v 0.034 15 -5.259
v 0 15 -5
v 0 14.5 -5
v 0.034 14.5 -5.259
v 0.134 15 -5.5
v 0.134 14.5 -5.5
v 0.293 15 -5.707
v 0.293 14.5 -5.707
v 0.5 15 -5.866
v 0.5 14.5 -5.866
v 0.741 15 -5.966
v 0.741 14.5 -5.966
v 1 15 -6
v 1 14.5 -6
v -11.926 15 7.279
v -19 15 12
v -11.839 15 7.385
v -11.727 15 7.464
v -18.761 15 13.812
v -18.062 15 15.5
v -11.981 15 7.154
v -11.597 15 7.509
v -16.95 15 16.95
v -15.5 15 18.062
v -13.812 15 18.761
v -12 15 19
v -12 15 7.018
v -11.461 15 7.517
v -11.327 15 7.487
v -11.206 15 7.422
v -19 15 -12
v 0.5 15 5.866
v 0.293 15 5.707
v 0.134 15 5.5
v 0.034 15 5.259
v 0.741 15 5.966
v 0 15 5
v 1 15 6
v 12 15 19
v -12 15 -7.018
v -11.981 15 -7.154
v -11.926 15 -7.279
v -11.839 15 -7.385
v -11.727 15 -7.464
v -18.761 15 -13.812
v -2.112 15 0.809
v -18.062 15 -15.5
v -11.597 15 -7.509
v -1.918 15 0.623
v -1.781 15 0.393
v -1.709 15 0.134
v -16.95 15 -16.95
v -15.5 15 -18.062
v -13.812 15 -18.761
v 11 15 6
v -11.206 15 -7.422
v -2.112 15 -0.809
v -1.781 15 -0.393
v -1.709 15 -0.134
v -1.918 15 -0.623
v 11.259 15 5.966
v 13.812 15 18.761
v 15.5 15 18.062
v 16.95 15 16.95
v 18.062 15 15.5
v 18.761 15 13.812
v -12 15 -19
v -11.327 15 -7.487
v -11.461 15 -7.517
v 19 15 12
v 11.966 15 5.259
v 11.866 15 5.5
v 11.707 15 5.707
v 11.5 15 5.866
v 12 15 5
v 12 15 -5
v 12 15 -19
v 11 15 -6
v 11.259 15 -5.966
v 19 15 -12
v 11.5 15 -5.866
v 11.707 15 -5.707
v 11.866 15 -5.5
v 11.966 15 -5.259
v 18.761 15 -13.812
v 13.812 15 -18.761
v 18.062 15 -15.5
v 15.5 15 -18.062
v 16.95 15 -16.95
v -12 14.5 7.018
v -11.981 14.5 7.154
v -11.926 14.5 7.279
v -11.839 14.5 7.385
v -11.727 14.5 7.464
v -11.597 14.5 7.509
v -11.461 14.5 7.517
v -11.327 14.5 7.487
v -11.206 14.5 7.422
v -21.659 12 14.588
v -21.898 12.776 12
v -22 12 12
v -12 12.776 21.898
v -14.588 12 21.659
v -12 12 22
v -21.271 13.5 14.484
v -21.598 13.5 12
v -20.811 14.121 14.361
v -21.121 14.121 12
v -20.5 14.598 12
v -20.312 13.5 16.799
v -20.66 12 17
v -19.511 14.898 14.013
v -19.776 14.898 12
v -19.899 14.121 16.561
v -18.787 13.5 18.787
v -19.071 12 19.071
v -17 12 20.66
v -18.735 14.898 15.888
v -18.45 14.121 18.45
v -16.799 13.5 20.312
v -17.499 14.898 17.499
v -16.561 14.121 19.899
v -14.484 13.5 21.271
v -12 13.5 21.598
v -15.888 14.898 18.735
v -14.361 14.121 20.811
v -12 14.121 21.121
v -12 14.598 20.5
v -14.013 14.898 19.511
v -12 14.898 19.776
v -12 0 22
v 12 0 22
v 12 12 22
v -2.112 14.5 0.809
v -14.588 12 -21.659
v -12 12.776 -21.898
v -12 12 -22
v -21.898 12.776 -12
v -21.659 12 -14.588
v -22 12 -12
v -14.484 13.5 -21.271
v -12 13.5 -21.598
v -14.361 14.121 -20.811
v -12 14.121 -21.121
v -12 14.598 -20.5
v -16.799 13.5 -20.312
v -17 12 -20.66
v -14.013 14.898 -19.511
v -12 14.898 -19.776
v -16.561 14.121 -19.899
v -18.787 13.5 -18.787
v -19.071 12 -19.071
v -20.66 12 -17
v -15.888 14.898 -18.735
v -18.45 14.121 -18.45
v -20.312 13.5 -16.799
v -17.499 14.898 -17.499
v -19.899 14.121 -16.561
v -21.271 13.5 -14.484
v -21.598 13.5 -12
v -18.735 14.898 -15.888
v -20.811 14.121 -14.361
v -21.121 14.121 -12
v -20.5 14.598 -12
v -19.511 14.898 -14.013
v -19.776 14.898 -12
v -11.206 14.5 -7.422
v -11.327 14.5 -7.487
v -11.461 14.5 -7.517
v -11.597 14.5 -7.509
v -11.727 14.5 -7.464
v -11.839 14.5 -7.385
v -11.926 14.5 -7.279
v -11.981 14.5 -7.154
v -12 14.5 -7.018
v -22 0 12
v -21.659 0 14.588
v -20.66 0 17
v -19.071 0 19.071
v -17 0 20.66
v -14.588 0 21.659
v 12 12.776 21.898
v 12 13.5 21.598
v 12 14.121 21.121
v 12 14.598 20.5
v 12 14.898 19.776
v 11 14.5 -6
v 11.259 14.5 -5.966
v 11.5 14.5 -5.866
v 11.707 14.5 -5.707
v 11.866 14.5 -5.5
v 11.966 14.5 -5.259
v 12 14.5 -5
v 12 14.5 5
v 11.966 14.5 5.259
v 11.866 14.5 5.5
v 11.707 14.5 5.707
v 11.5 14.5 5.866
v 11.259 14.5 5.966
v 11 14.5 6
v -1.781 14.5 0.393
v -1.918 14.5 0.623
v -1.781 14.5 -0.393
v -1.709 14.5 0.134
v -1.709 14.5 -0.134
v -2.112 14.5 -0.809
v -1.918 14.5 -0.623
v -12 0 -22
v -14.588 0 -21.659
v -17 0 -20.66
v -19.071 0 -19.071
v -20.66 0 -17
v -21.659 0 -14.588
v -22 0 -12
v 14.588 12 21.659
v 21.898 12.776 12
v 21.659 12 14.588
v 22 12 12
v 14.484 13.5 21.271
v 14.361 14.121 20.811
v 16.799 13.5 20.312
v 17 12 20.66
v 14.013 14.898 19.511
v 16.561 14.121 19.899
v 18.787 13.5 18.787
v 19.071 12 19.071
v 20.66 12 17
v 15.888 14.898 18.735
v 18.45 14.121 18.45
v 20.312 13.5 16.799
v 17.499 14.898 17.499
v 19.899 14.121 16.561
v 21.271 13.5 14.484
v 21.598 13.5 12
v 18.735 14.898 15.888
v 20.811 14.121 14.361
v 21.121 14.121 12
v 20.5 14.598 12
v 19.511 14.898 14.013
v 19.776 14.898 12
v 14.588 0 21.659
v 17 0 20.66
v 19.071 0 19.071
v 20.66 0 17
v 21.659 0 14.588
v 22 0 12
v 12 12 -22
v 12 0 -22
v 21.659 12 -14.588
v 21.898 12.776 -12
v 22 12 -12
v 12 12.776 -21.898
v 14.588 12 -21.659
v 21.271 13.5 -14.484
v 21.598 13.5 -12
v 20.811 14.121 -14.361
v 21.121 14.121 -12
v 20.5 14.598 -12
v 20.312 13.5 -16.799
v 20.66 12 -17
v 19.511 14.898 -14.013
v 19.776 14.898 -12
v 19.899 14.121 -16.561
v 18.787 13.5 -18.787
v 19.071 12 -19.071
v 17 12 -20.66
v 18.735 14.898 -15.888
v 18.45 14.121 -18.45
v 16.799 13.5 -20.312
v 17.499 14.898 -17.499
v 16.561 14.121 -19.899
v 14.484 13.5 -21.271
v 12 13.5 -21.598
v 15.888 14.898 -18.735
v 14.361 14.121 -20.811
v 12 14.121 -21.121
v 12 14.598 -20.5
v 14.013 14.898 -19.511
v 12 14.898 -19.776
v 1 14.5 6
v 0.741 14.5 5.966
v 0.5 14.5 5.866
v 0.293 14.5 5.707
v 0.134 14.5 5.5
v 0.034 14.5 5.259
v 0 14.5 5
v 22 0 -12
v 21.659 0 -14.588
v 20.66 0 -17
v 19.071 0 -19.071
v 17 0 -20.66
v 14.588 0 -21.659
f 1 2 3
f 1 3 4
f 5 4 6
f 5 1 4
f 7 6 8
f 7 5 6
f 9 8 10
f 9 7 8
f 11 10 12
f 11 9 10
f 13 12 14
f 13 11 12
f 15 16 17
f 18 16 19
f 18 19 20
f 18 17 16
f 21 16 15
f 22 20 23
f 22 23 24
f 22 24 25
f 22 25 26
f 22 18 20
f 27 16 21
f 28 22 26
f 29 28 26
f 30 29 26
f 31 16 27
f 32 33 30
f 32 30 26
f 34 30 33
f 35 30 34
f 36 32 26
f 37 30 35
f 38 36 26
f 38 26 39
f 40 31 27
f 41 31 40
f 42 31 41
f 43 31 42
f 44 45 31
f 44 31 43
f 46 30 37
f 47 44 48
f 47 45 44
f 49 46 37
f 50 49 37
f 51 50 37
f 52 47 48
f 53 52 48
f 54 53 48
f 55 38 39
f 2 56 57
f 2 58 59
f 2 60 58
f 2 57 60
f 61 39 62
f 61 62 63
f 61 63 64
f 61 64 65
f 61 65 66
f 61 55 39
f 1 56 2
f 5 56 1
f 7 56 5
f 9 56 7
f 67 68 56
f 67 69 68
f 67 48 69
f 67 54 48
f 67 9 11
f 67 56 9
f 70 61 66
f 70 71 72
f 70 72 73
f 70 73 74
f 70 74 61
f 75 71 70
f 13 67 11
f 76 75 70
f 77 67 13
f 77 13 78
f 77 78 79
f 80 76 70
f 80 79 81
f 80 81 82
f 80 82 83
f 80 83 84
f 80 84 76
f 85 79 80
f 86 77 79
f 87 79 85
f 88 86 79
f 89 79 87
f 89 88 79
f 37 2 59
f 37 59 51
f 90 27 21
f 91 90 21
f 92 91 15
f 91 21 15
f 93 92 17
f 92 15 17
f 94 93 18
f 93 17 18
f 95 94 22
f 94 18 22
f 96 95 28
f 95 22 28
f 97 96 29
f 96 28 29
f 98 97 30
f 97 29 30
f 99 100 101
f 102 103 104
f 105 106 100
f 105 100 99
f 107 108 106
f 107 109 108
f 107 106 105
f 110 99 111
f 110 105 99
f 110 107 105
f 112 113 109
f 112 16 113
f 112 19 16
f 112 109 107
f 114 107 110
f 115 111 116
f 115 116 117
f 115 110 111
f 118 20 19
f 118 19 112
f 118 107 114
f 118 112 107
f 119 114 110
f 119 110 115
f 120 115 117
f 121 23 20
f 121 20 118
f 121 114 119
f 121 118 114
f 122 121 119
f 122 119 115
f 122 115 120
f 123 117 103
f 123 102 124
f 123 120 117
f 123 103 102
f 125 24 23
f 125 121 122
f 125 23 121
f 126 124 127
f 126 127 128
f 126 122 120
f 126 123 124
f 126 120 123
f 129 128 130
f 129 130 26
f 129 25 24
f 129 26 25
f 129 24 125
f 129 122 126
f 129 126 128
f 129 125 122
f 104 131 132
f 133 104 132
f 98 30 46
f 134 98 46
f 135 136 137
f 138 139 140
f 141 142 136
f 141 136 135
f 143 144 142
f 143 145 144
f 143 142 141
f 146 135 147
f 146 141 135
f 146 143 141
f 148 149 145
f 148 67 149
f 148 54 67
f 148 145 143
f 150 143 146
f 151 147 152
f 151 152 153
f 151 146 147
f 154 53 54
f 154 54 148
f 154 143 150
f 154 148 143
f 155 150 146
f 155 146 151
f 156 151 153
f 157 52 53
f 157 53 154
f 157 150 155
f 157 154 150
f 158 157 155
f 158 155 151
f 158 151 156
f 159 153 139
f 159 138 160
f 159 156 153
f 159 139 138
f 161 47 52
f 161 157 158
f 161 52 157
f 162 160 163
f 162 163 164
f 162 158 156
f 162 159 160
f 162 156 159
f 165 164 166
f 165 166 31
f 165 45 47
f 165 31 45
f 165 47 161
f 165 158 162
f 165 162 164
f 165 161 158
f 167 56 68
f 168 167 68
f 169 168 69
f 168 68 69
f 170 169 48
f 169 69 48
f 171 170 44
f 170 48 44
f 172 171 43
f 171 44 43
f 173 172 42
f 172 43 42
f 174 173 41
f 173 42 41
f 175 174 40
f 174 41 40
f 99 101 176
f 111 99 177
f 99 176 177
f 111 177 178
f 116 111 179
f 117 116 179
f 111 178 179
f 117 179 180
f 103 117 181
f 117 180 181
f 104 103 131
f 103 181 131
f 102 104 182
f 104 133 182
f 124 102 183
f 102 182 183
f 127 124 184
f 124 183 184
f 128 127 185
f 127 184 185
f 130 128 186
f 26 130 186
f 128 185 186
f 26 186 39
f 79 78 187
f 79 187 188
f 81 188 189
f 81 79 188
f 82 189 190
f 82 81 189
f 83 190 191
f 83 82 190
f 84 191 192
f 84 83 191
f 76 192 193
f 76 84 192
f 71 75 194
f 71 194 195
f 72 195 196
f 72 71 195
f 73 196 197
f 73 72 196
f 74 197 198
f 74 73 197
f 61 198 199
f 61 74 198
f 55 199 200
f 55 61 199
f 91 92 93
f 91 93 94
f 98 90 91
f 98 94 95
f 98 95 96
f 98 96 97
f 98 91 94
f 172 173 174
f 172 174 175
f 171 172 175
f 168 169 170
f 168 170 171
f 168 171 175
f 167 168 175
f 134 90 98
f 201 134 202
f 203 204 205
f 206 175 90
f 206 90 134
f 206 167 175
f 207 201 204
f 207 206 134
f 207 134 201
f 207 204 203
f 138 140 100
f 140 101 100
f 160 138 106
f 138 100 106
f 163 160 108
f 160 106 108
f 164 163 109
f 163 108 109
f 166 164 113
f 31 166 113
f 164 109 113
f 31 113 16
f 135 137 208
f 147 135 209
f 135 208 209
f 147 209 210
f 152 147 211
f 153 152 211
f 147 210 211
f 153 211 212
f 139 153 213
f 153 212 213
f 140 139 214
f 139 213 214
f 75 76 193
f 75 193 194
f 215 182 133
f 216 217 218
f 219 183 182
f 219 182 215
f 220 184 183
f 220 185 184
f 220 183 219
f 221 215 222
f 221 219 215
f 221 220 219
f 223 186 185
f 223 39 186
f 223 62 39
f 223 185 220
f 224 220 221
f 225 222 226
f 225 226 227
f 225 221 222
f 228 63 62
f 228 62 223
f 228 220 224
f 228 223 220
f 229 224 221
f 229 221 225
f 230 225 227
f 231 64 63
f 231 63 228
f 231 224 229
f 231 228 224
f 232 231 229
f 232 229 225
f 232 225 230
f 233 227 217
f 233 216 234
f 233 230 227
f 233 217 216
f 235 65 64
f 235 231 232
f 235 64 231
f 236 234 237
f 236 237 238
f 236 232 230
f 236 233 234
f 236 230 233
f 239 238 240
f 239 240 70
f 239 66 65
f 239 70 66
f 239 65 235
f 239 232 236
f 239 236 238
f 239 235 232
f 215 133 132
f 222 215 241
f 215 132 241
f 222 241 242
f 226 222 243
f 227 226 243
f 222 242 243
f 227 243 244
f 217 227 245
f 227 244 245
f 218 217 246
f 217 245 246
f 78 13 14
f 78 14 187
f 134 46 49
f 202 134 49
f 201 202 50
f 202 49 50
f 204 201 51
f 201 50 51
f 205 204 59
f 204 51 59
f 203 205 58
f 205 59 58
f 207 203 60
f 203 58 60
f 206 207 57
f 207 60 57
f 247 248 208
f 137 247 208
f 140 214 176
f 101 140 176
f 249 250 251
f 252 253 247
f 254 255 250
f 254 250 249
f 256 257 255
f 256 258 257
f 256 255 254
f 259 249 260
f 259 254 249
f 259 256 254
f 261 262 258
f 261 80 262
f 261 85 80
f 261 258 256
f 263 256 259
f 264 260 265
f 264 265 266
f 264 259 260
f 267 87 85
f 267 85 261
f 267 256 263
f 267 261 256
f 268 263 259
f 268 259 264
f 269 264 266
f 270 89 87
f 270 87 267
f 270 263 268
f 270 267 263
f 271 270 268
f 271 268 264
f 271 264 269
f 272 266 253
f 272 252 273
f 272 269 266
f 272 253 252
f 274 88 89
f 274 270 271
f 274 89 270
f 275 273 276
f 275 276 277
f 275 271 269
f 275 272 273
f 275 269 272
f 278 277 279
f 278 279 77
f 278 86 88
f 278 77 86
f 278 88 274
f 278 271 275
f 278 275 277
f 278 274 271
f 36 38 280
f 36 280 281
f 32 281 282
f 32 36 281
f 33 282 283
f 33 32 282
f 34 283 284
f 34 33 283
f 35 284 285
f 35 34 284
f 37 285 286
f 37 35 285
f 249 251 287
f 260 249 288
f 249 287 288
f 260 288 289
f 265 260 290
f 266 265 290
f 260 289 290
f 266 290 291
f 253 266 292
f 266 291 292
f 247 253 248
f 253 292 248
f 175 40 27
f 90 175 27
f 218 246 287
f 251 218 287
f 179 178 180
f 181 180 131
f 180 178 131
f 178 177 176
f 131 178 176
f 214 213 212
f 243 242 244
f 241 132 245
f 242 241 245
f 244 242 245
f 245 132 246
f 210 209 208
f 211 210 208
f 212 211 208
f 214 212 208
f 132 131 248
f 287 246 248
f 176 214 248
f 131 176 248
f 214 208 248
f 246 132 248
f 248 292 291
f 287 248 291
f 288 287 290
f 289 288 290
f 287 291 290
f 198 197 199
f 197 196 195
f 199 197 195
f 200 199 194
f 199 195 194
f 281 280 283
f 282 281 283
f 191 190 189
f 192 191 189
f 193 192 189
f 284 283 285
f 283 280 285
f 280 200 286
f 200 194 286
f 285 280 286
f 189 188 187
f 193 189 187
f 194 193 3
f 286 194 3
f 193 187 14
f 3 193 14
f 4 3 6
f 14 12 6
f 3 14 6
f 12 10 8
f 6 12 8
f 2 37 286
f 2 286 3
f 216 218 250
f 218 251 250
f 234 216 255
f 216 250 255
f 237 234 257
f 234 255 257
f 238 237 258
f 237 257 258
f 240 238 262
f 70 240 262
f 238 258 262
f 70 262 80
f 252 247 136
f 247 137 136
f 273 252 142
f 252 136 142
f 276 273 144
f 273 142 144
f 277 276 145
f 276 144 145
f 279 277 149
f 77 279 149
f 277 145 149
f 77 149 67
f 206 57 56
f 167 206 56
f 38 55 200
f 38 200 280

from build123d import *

# Parameters (mm, degrees)
BOSS_EXTRU_1_DEPTH      = 15
CONG_1_R                = 3
ENL_V_MAT_EXTRU_1_DEPTH = 0.5


with BuildPart() as part:
    # Esquisse1 → Boss.-Extru.1 (new body)
    with BuildSketch(Plane(origin=(0, 0, 0), x_dir=(1, 0, 0), z_dir=(0, 1, 0))):
        with BuildLine():
            Line((-12, -22), (12, -22))
            ThreePointArc((12, -22), (19.071067812, -19.071067812), (22, -12))
            Line((22, -12), (22, 12))
            ThreePointArc((22, 12), (19.071067812, 19.071067812), (12, 22))
            Line((12, 22), (-12, 22))
            ThreePointArc((-12, 22), (-19.071067812, 19.071067812), (-22, 12))
            Line((-22, 12), (-22, -12))
            ThreePointArc((-22, -12), (-19.071067812, -19.071067812), (-12, -22))
        make_face()
    extrude(amount=BOSS_EXTRU_1_DEPTH)

    # Congé1
    cong_1_edges = [part.edges().sort_by_distance(p)[0] for p in [
        (19.071067812, 15, 19.071067812),
        (22, 15, 0),
        (19.071067812, 15, -19.071067812),
        (0, 15, -22),
        (-19.071067812, 15, -19.071067812),
        (-22, 15, 0),
        (-19.071067812, 15, 19.071067812),
        (0, 15, 22),
    ]]
    fillet(cong_1_edges, radius=CONG_1_R)

    # Esquisse2 → Enlèv. mat.-Extru.1 (cut)
    with BuildSketch(Plane(origin=(0, 15, 0), x_dir=(1, 0, 0), z_dir=(0, 1, 0))):
        with BuildLine():
            Line((-12, 7.018114977), (-12, -7.018114977))
            ThreePointArc((-12, -7.018114977), (-11.726888823, -7.46367245), (-11.205914151, -7.422483019))
            Line((-11.205914151, -7.422483019), (-2.112012116, -0.808736084))
            ThreePointArc((-2.112012116, -0.808736084), (-1.700183814, 0), (-2.112012116, 0.808736084))
            Line((-2.112012116, 0.808736084), (-11.205914151, 7.422483019))
            ThreePointArc((-11.205914151, 7.422483019), (-11.726888823, 7.46367245), (-12, 7.018114977))
        make_face()
        with BuildLine():
            Line((1, 6), (11, 6))
            ThreePointArc((11, 6), (11.707106781, 5.707106781), (12, 5))
            Line((12, 5), (12, -5))
            ThreePointArc((12, -5), (11.707106781, -5.707106781), (11, -6))
            Line((11, -6), (1, -6))
            ThreePointArc((1, -6), (0.292893219, -5.707106781), (0, -5))
            Line((0, -5), (0, 5))
            ThreePointArc((0, 5), (0.292893219, 5.707106781), (1, 6))
        make_face()
    extrude(amount=-ENL_V_MAT_EXTRU_1_DEPTH, mode=Mode.SUBTRACT)


solid = part.part
